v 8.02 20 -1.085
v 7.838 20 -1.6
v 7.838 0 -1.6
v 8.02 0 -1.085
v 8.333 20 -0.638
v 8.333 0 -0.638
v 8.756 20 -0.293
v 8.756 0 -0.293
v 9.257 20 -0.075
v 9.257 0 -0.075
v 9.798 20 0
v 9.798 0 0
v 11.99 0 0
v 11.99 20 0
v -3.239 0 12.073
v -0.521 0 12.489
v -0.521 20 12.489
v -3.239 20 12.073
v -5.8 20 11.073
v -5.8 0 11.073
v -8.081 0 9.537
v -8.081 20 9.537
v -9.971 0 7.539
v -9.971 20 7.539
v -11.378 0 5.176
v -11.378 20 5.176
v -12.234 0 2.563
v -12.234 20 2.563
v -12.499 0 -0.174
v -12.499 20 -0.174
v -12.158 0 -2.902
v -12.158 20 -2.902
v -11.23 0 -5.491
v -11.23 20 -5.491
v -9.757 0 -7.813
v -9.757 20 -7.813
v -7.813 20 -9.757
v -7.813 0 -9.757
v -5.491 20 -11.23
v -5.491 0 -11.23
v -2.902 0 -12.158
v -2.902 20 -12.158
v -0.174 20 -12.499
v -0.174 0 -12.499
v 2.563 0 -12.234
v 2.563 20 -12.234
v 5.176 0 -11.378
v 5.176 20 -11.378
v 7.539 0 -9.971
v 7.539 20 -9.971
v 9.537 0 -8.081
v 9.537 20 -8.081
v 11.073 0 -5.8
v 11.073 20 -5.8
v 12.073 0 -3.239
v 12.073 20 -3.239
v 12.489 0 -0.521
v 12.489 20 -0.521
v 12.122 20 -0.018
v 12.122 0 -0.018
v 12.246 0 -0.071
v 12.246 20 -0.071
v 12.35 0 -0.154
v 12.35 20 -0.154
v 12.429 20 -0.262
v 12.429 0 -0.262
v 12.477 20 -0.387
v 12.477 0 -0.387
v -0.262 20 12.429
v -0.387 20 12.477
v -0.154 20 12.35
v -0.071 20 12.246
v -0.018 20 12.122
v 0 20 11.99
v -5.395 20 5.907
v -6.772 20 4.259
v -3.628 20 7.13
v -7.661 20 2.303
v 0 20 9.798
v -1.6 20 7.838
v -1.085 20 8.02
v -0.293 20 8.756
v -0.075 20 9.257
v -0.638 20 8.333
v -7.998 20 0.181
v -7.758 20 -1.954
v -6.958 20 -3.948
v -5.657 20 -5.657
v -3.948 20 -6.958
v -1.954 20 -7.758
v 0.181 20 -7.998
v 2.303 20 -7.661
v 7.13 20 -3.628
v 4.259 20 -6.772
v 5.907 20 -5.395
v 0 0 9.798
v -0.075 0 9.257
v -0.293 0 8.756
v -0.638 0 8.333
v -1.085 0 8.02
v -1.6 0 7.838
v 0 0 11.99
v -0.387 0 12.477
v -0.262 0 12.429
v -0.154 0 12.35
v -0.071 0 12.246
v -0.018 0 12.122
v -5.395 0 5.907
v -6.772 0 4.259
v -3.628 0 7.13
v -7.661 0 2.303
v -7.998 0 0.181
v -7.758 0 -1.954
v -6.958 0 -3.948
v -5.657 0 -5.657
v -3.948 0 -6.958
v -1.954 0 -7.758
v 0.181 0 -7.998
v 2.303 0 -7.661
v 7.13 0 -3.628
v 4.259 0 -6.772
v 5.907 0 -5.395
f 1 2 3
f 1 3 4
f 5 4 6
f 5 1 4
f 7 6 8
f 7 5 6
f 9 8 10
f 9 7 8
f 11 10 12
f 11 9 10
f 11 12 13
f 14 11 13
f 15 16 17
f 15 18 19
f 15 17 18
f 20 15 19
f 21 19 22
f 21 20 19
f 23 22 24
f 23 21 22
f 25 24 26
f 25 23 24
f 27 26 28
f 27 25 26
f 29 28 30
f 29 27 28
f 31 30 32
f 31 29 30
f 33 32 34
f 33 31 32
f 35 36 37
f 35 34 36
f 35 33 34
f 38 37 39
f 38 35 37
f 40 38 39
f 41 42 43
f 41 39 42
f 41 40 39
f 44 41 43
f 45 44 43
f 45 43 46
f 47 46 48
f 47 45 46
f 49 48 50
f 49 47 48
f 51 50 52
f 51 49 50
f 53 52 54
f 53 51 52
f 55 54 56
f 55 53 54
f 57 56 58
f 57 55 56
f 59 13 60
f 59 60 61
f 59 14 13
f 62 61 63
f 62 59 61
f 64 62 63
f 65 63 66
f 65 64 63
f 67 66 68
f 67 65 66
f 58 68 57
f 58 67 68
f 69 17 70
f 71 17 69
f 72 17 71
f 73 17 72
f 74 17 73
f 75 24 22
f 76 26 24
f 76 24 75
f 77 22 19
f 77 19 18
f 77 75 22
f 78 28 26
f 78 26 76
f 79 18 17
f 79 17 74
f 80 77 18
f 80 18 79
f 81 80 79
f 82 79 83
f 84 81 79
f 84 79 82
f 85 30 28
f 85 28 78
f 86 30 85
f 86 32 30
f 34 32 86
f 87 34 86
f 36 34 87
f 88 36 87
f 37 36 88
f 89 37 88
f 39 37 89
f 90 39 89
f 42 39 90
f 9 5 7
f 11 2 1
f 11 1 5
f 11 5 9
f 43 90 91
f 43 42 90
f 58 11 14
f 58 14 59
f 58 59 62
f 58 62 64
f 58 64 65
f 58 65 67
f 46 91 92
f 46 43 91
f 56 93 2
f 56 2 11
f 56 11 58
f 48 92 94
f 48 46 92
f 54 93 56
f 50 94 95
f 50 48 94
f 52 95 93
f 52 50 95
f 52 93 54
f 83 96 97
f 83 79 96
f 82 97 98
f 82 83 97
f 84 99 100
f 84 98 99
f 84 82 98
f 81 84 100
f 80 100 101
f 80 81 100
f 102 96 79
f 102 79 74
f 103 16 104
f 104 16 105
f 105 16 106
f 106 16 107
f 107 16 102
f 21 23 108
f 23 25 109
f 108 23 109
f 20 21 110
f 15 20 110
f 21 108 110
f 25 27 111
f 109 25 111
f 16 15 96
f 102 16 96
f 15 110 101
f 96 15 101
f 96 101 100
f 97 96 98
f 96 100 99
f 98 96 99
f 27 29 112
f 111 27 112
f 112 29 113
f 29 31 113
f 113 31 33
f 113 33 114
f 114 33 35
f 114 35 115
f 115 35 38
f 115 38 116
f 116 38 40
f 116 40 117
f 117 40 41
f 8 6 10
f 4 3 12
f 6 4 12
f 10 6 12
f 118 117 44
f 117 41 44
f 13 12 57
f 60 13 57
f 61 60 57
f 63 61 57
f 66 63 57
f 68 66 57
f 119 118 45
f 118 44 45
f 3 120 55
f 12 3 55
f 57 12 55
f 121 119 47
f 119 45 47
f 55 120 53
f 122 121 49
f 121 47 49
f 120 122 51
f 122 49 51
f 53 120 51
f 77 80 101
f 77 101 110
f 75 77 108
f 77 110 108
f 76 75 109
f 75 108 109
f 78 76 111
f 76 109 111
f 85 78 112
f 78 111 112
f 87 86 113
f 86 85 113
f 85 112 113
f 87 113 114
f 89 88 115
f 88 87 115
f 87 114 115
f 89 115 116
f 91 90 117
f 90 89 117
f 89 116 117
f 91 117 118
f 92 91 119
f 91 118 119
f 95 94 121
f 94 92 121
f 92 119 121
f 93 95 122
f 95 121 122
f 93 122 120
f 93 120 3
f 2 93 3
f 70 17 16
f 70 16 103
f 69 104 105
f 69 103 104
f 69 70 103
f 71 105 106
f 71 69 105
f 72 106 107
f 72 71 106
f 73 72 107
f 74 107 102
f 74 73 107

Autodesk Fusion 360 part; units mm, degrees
sketch "Sketch1" plane through (0, 0, 0) normal (0, 1, 0) x (1, 0, 0)
  circle A0 centre (0, 0) radius 8
  circle A1 centre (0, 0) radius 12.5
  line L0 (0, 0) -> (12.5, 0)
  line L1 (0, 0) -> (0, -12.5)
  dimension "d1" = 16
  dimension "d2" = 25
extrude "Extrude1" add sketch "Sketch1" along normal blind 20 contours A0 A1 L0 L1 picked at (-5.2365, -9.6417)
fillet "Fillet1" radius 2 2 edges at (8, 10, 0) (0, 10, 8)
fillet "Fillet2" radius 0.5 2 edges at (0, 10, 12.5) (12.5, 10, 0)
